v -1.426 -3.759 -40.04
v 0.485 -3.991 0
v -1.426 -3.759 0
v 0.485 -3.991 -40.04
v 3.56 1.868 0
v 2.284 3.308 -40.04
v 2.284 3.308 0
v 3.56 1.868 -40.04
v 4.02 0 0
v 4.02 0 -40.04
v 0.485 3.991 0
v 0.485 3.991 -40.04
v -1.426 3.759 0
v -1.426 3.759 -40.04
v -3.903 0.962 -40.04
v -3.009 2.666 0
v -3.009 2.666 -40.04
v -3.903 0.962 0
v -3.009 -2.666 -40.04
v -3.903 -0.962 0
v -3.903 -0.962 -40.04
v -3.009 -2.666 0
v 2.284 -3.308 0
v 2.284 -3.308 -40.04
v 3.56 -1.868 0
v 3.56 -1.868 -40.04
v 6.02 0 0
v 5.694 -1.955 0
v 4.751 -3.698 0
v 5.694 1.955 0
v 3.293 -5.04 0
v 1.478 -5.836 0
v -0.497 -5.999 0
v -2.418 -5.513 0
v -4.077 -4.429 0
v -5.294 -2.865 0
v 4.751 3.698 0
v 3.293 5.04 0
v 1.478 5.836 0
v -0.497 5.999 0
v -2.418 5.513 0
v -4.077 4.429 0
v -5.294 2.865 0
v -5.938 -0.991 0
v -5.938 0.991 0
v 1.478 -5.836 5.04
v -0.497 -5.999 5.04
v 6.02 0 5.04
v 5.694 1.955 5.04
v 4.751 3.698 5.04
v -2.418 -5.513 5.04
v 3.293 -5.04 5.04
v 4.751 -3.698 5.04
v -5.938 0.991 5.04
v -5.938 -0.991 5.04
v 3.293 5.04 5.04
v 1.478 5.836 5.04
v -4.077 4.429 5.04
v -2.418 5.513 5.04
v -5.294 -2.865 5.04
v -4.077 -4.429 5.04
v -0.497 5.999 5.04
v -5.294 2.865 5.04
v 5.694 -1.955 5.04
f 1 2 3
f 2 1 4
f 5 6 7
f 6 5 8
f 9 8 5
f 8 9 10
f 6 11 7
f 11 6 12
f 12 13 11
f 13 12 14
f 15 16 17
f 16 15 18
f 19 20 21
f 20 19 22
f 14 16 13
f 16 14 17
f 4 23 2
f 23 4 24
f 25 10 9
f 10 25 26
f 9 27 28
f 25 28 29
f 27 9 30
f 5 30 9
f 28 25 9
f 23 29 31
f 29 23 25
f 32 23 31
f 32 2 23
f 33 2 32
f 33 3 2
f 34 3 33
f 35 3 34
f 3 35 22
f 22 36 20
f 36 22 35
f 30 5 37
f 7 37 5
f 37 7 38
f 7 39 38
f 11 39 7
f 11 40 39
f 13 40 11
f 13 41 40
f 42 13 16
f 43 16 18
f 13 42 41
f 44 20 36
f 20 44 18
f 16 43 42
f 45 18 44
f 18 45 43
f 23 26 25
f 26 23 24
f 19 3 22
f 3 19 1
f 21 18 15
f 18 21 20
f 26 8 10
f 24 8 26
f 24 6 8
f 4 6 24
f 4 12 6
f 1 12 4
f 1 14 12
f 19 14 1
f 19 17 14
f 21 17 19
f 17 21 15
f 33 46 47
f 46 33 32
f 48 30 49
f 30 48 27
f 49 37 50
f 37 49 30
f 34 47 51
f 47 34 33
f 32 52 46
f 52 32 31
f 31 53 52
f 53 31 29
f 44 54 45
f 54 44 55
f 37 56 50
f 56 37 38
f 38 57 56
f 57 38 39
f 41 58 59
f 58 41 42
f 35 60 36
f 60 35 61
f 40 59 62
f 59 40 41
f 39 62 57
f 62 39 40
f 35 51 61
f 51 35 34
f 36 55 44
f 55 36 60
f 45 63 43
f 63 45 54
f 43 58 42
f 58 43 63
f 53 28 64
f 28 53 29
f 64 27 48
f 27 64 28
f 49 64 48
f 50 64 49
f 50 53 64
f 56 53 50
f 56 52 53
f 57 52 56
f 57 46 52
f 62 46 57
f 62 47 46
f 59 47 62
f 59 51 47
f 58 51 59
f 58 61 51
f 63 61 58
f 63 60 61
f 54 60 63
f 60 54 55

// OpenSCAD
// file: ../Parameters.scad
function mm(i) = i*25.4; 

//Build dimensions (x,y,z)-- x, y and z of printable area, NOT of overall device

//z-rod length, diameter-- dependent on which rods you buy
//(bearing diameter is dependent on rod diameter)

function ZrodLength()=1000;
function ZrodDiameter()=20;
function ZrodRadius()=ZrodDiameter()/2;

function ZrodSpacing()=130;


//parametric of which hotend is being used (printerbot or bucha nozzle)

//stepper vs servo

//3 parameters (1 for each link) horizontal vs vertical

//paper is a parametric vitamin

//distance between link arms will be calculable based on radius of toolplate





//tolerances
function LaserCutTolerance() = .02;
function 3dPrinterTolerance() = .04;
// main file
use <../Parameters.scad>

function ScrewDiameter()= 8 + 3dPrinterTolerance();
function ScrewLength()= 40 + 3dPrinterTolerance();
function ScrewHeadDiameter()= 12 + 3dPrinterTolerance();
function ScrewHeadHeight()= 5 + 3dPrinterTolerance();

//err on the side of smaller tolerances for screws

module screw()
{
	union()
	{
		translate([0,0,-ScrewLength()])
		{
			cylinder(ScrewLength(), ScrewDiameter()/2,ScrewDiameter()/2);
		}
		cylinder(ScrewHeadHeight(), ScrewHeadDiameter()/2,ScrewHeadDiameter()/2);
	}
}

screw();
